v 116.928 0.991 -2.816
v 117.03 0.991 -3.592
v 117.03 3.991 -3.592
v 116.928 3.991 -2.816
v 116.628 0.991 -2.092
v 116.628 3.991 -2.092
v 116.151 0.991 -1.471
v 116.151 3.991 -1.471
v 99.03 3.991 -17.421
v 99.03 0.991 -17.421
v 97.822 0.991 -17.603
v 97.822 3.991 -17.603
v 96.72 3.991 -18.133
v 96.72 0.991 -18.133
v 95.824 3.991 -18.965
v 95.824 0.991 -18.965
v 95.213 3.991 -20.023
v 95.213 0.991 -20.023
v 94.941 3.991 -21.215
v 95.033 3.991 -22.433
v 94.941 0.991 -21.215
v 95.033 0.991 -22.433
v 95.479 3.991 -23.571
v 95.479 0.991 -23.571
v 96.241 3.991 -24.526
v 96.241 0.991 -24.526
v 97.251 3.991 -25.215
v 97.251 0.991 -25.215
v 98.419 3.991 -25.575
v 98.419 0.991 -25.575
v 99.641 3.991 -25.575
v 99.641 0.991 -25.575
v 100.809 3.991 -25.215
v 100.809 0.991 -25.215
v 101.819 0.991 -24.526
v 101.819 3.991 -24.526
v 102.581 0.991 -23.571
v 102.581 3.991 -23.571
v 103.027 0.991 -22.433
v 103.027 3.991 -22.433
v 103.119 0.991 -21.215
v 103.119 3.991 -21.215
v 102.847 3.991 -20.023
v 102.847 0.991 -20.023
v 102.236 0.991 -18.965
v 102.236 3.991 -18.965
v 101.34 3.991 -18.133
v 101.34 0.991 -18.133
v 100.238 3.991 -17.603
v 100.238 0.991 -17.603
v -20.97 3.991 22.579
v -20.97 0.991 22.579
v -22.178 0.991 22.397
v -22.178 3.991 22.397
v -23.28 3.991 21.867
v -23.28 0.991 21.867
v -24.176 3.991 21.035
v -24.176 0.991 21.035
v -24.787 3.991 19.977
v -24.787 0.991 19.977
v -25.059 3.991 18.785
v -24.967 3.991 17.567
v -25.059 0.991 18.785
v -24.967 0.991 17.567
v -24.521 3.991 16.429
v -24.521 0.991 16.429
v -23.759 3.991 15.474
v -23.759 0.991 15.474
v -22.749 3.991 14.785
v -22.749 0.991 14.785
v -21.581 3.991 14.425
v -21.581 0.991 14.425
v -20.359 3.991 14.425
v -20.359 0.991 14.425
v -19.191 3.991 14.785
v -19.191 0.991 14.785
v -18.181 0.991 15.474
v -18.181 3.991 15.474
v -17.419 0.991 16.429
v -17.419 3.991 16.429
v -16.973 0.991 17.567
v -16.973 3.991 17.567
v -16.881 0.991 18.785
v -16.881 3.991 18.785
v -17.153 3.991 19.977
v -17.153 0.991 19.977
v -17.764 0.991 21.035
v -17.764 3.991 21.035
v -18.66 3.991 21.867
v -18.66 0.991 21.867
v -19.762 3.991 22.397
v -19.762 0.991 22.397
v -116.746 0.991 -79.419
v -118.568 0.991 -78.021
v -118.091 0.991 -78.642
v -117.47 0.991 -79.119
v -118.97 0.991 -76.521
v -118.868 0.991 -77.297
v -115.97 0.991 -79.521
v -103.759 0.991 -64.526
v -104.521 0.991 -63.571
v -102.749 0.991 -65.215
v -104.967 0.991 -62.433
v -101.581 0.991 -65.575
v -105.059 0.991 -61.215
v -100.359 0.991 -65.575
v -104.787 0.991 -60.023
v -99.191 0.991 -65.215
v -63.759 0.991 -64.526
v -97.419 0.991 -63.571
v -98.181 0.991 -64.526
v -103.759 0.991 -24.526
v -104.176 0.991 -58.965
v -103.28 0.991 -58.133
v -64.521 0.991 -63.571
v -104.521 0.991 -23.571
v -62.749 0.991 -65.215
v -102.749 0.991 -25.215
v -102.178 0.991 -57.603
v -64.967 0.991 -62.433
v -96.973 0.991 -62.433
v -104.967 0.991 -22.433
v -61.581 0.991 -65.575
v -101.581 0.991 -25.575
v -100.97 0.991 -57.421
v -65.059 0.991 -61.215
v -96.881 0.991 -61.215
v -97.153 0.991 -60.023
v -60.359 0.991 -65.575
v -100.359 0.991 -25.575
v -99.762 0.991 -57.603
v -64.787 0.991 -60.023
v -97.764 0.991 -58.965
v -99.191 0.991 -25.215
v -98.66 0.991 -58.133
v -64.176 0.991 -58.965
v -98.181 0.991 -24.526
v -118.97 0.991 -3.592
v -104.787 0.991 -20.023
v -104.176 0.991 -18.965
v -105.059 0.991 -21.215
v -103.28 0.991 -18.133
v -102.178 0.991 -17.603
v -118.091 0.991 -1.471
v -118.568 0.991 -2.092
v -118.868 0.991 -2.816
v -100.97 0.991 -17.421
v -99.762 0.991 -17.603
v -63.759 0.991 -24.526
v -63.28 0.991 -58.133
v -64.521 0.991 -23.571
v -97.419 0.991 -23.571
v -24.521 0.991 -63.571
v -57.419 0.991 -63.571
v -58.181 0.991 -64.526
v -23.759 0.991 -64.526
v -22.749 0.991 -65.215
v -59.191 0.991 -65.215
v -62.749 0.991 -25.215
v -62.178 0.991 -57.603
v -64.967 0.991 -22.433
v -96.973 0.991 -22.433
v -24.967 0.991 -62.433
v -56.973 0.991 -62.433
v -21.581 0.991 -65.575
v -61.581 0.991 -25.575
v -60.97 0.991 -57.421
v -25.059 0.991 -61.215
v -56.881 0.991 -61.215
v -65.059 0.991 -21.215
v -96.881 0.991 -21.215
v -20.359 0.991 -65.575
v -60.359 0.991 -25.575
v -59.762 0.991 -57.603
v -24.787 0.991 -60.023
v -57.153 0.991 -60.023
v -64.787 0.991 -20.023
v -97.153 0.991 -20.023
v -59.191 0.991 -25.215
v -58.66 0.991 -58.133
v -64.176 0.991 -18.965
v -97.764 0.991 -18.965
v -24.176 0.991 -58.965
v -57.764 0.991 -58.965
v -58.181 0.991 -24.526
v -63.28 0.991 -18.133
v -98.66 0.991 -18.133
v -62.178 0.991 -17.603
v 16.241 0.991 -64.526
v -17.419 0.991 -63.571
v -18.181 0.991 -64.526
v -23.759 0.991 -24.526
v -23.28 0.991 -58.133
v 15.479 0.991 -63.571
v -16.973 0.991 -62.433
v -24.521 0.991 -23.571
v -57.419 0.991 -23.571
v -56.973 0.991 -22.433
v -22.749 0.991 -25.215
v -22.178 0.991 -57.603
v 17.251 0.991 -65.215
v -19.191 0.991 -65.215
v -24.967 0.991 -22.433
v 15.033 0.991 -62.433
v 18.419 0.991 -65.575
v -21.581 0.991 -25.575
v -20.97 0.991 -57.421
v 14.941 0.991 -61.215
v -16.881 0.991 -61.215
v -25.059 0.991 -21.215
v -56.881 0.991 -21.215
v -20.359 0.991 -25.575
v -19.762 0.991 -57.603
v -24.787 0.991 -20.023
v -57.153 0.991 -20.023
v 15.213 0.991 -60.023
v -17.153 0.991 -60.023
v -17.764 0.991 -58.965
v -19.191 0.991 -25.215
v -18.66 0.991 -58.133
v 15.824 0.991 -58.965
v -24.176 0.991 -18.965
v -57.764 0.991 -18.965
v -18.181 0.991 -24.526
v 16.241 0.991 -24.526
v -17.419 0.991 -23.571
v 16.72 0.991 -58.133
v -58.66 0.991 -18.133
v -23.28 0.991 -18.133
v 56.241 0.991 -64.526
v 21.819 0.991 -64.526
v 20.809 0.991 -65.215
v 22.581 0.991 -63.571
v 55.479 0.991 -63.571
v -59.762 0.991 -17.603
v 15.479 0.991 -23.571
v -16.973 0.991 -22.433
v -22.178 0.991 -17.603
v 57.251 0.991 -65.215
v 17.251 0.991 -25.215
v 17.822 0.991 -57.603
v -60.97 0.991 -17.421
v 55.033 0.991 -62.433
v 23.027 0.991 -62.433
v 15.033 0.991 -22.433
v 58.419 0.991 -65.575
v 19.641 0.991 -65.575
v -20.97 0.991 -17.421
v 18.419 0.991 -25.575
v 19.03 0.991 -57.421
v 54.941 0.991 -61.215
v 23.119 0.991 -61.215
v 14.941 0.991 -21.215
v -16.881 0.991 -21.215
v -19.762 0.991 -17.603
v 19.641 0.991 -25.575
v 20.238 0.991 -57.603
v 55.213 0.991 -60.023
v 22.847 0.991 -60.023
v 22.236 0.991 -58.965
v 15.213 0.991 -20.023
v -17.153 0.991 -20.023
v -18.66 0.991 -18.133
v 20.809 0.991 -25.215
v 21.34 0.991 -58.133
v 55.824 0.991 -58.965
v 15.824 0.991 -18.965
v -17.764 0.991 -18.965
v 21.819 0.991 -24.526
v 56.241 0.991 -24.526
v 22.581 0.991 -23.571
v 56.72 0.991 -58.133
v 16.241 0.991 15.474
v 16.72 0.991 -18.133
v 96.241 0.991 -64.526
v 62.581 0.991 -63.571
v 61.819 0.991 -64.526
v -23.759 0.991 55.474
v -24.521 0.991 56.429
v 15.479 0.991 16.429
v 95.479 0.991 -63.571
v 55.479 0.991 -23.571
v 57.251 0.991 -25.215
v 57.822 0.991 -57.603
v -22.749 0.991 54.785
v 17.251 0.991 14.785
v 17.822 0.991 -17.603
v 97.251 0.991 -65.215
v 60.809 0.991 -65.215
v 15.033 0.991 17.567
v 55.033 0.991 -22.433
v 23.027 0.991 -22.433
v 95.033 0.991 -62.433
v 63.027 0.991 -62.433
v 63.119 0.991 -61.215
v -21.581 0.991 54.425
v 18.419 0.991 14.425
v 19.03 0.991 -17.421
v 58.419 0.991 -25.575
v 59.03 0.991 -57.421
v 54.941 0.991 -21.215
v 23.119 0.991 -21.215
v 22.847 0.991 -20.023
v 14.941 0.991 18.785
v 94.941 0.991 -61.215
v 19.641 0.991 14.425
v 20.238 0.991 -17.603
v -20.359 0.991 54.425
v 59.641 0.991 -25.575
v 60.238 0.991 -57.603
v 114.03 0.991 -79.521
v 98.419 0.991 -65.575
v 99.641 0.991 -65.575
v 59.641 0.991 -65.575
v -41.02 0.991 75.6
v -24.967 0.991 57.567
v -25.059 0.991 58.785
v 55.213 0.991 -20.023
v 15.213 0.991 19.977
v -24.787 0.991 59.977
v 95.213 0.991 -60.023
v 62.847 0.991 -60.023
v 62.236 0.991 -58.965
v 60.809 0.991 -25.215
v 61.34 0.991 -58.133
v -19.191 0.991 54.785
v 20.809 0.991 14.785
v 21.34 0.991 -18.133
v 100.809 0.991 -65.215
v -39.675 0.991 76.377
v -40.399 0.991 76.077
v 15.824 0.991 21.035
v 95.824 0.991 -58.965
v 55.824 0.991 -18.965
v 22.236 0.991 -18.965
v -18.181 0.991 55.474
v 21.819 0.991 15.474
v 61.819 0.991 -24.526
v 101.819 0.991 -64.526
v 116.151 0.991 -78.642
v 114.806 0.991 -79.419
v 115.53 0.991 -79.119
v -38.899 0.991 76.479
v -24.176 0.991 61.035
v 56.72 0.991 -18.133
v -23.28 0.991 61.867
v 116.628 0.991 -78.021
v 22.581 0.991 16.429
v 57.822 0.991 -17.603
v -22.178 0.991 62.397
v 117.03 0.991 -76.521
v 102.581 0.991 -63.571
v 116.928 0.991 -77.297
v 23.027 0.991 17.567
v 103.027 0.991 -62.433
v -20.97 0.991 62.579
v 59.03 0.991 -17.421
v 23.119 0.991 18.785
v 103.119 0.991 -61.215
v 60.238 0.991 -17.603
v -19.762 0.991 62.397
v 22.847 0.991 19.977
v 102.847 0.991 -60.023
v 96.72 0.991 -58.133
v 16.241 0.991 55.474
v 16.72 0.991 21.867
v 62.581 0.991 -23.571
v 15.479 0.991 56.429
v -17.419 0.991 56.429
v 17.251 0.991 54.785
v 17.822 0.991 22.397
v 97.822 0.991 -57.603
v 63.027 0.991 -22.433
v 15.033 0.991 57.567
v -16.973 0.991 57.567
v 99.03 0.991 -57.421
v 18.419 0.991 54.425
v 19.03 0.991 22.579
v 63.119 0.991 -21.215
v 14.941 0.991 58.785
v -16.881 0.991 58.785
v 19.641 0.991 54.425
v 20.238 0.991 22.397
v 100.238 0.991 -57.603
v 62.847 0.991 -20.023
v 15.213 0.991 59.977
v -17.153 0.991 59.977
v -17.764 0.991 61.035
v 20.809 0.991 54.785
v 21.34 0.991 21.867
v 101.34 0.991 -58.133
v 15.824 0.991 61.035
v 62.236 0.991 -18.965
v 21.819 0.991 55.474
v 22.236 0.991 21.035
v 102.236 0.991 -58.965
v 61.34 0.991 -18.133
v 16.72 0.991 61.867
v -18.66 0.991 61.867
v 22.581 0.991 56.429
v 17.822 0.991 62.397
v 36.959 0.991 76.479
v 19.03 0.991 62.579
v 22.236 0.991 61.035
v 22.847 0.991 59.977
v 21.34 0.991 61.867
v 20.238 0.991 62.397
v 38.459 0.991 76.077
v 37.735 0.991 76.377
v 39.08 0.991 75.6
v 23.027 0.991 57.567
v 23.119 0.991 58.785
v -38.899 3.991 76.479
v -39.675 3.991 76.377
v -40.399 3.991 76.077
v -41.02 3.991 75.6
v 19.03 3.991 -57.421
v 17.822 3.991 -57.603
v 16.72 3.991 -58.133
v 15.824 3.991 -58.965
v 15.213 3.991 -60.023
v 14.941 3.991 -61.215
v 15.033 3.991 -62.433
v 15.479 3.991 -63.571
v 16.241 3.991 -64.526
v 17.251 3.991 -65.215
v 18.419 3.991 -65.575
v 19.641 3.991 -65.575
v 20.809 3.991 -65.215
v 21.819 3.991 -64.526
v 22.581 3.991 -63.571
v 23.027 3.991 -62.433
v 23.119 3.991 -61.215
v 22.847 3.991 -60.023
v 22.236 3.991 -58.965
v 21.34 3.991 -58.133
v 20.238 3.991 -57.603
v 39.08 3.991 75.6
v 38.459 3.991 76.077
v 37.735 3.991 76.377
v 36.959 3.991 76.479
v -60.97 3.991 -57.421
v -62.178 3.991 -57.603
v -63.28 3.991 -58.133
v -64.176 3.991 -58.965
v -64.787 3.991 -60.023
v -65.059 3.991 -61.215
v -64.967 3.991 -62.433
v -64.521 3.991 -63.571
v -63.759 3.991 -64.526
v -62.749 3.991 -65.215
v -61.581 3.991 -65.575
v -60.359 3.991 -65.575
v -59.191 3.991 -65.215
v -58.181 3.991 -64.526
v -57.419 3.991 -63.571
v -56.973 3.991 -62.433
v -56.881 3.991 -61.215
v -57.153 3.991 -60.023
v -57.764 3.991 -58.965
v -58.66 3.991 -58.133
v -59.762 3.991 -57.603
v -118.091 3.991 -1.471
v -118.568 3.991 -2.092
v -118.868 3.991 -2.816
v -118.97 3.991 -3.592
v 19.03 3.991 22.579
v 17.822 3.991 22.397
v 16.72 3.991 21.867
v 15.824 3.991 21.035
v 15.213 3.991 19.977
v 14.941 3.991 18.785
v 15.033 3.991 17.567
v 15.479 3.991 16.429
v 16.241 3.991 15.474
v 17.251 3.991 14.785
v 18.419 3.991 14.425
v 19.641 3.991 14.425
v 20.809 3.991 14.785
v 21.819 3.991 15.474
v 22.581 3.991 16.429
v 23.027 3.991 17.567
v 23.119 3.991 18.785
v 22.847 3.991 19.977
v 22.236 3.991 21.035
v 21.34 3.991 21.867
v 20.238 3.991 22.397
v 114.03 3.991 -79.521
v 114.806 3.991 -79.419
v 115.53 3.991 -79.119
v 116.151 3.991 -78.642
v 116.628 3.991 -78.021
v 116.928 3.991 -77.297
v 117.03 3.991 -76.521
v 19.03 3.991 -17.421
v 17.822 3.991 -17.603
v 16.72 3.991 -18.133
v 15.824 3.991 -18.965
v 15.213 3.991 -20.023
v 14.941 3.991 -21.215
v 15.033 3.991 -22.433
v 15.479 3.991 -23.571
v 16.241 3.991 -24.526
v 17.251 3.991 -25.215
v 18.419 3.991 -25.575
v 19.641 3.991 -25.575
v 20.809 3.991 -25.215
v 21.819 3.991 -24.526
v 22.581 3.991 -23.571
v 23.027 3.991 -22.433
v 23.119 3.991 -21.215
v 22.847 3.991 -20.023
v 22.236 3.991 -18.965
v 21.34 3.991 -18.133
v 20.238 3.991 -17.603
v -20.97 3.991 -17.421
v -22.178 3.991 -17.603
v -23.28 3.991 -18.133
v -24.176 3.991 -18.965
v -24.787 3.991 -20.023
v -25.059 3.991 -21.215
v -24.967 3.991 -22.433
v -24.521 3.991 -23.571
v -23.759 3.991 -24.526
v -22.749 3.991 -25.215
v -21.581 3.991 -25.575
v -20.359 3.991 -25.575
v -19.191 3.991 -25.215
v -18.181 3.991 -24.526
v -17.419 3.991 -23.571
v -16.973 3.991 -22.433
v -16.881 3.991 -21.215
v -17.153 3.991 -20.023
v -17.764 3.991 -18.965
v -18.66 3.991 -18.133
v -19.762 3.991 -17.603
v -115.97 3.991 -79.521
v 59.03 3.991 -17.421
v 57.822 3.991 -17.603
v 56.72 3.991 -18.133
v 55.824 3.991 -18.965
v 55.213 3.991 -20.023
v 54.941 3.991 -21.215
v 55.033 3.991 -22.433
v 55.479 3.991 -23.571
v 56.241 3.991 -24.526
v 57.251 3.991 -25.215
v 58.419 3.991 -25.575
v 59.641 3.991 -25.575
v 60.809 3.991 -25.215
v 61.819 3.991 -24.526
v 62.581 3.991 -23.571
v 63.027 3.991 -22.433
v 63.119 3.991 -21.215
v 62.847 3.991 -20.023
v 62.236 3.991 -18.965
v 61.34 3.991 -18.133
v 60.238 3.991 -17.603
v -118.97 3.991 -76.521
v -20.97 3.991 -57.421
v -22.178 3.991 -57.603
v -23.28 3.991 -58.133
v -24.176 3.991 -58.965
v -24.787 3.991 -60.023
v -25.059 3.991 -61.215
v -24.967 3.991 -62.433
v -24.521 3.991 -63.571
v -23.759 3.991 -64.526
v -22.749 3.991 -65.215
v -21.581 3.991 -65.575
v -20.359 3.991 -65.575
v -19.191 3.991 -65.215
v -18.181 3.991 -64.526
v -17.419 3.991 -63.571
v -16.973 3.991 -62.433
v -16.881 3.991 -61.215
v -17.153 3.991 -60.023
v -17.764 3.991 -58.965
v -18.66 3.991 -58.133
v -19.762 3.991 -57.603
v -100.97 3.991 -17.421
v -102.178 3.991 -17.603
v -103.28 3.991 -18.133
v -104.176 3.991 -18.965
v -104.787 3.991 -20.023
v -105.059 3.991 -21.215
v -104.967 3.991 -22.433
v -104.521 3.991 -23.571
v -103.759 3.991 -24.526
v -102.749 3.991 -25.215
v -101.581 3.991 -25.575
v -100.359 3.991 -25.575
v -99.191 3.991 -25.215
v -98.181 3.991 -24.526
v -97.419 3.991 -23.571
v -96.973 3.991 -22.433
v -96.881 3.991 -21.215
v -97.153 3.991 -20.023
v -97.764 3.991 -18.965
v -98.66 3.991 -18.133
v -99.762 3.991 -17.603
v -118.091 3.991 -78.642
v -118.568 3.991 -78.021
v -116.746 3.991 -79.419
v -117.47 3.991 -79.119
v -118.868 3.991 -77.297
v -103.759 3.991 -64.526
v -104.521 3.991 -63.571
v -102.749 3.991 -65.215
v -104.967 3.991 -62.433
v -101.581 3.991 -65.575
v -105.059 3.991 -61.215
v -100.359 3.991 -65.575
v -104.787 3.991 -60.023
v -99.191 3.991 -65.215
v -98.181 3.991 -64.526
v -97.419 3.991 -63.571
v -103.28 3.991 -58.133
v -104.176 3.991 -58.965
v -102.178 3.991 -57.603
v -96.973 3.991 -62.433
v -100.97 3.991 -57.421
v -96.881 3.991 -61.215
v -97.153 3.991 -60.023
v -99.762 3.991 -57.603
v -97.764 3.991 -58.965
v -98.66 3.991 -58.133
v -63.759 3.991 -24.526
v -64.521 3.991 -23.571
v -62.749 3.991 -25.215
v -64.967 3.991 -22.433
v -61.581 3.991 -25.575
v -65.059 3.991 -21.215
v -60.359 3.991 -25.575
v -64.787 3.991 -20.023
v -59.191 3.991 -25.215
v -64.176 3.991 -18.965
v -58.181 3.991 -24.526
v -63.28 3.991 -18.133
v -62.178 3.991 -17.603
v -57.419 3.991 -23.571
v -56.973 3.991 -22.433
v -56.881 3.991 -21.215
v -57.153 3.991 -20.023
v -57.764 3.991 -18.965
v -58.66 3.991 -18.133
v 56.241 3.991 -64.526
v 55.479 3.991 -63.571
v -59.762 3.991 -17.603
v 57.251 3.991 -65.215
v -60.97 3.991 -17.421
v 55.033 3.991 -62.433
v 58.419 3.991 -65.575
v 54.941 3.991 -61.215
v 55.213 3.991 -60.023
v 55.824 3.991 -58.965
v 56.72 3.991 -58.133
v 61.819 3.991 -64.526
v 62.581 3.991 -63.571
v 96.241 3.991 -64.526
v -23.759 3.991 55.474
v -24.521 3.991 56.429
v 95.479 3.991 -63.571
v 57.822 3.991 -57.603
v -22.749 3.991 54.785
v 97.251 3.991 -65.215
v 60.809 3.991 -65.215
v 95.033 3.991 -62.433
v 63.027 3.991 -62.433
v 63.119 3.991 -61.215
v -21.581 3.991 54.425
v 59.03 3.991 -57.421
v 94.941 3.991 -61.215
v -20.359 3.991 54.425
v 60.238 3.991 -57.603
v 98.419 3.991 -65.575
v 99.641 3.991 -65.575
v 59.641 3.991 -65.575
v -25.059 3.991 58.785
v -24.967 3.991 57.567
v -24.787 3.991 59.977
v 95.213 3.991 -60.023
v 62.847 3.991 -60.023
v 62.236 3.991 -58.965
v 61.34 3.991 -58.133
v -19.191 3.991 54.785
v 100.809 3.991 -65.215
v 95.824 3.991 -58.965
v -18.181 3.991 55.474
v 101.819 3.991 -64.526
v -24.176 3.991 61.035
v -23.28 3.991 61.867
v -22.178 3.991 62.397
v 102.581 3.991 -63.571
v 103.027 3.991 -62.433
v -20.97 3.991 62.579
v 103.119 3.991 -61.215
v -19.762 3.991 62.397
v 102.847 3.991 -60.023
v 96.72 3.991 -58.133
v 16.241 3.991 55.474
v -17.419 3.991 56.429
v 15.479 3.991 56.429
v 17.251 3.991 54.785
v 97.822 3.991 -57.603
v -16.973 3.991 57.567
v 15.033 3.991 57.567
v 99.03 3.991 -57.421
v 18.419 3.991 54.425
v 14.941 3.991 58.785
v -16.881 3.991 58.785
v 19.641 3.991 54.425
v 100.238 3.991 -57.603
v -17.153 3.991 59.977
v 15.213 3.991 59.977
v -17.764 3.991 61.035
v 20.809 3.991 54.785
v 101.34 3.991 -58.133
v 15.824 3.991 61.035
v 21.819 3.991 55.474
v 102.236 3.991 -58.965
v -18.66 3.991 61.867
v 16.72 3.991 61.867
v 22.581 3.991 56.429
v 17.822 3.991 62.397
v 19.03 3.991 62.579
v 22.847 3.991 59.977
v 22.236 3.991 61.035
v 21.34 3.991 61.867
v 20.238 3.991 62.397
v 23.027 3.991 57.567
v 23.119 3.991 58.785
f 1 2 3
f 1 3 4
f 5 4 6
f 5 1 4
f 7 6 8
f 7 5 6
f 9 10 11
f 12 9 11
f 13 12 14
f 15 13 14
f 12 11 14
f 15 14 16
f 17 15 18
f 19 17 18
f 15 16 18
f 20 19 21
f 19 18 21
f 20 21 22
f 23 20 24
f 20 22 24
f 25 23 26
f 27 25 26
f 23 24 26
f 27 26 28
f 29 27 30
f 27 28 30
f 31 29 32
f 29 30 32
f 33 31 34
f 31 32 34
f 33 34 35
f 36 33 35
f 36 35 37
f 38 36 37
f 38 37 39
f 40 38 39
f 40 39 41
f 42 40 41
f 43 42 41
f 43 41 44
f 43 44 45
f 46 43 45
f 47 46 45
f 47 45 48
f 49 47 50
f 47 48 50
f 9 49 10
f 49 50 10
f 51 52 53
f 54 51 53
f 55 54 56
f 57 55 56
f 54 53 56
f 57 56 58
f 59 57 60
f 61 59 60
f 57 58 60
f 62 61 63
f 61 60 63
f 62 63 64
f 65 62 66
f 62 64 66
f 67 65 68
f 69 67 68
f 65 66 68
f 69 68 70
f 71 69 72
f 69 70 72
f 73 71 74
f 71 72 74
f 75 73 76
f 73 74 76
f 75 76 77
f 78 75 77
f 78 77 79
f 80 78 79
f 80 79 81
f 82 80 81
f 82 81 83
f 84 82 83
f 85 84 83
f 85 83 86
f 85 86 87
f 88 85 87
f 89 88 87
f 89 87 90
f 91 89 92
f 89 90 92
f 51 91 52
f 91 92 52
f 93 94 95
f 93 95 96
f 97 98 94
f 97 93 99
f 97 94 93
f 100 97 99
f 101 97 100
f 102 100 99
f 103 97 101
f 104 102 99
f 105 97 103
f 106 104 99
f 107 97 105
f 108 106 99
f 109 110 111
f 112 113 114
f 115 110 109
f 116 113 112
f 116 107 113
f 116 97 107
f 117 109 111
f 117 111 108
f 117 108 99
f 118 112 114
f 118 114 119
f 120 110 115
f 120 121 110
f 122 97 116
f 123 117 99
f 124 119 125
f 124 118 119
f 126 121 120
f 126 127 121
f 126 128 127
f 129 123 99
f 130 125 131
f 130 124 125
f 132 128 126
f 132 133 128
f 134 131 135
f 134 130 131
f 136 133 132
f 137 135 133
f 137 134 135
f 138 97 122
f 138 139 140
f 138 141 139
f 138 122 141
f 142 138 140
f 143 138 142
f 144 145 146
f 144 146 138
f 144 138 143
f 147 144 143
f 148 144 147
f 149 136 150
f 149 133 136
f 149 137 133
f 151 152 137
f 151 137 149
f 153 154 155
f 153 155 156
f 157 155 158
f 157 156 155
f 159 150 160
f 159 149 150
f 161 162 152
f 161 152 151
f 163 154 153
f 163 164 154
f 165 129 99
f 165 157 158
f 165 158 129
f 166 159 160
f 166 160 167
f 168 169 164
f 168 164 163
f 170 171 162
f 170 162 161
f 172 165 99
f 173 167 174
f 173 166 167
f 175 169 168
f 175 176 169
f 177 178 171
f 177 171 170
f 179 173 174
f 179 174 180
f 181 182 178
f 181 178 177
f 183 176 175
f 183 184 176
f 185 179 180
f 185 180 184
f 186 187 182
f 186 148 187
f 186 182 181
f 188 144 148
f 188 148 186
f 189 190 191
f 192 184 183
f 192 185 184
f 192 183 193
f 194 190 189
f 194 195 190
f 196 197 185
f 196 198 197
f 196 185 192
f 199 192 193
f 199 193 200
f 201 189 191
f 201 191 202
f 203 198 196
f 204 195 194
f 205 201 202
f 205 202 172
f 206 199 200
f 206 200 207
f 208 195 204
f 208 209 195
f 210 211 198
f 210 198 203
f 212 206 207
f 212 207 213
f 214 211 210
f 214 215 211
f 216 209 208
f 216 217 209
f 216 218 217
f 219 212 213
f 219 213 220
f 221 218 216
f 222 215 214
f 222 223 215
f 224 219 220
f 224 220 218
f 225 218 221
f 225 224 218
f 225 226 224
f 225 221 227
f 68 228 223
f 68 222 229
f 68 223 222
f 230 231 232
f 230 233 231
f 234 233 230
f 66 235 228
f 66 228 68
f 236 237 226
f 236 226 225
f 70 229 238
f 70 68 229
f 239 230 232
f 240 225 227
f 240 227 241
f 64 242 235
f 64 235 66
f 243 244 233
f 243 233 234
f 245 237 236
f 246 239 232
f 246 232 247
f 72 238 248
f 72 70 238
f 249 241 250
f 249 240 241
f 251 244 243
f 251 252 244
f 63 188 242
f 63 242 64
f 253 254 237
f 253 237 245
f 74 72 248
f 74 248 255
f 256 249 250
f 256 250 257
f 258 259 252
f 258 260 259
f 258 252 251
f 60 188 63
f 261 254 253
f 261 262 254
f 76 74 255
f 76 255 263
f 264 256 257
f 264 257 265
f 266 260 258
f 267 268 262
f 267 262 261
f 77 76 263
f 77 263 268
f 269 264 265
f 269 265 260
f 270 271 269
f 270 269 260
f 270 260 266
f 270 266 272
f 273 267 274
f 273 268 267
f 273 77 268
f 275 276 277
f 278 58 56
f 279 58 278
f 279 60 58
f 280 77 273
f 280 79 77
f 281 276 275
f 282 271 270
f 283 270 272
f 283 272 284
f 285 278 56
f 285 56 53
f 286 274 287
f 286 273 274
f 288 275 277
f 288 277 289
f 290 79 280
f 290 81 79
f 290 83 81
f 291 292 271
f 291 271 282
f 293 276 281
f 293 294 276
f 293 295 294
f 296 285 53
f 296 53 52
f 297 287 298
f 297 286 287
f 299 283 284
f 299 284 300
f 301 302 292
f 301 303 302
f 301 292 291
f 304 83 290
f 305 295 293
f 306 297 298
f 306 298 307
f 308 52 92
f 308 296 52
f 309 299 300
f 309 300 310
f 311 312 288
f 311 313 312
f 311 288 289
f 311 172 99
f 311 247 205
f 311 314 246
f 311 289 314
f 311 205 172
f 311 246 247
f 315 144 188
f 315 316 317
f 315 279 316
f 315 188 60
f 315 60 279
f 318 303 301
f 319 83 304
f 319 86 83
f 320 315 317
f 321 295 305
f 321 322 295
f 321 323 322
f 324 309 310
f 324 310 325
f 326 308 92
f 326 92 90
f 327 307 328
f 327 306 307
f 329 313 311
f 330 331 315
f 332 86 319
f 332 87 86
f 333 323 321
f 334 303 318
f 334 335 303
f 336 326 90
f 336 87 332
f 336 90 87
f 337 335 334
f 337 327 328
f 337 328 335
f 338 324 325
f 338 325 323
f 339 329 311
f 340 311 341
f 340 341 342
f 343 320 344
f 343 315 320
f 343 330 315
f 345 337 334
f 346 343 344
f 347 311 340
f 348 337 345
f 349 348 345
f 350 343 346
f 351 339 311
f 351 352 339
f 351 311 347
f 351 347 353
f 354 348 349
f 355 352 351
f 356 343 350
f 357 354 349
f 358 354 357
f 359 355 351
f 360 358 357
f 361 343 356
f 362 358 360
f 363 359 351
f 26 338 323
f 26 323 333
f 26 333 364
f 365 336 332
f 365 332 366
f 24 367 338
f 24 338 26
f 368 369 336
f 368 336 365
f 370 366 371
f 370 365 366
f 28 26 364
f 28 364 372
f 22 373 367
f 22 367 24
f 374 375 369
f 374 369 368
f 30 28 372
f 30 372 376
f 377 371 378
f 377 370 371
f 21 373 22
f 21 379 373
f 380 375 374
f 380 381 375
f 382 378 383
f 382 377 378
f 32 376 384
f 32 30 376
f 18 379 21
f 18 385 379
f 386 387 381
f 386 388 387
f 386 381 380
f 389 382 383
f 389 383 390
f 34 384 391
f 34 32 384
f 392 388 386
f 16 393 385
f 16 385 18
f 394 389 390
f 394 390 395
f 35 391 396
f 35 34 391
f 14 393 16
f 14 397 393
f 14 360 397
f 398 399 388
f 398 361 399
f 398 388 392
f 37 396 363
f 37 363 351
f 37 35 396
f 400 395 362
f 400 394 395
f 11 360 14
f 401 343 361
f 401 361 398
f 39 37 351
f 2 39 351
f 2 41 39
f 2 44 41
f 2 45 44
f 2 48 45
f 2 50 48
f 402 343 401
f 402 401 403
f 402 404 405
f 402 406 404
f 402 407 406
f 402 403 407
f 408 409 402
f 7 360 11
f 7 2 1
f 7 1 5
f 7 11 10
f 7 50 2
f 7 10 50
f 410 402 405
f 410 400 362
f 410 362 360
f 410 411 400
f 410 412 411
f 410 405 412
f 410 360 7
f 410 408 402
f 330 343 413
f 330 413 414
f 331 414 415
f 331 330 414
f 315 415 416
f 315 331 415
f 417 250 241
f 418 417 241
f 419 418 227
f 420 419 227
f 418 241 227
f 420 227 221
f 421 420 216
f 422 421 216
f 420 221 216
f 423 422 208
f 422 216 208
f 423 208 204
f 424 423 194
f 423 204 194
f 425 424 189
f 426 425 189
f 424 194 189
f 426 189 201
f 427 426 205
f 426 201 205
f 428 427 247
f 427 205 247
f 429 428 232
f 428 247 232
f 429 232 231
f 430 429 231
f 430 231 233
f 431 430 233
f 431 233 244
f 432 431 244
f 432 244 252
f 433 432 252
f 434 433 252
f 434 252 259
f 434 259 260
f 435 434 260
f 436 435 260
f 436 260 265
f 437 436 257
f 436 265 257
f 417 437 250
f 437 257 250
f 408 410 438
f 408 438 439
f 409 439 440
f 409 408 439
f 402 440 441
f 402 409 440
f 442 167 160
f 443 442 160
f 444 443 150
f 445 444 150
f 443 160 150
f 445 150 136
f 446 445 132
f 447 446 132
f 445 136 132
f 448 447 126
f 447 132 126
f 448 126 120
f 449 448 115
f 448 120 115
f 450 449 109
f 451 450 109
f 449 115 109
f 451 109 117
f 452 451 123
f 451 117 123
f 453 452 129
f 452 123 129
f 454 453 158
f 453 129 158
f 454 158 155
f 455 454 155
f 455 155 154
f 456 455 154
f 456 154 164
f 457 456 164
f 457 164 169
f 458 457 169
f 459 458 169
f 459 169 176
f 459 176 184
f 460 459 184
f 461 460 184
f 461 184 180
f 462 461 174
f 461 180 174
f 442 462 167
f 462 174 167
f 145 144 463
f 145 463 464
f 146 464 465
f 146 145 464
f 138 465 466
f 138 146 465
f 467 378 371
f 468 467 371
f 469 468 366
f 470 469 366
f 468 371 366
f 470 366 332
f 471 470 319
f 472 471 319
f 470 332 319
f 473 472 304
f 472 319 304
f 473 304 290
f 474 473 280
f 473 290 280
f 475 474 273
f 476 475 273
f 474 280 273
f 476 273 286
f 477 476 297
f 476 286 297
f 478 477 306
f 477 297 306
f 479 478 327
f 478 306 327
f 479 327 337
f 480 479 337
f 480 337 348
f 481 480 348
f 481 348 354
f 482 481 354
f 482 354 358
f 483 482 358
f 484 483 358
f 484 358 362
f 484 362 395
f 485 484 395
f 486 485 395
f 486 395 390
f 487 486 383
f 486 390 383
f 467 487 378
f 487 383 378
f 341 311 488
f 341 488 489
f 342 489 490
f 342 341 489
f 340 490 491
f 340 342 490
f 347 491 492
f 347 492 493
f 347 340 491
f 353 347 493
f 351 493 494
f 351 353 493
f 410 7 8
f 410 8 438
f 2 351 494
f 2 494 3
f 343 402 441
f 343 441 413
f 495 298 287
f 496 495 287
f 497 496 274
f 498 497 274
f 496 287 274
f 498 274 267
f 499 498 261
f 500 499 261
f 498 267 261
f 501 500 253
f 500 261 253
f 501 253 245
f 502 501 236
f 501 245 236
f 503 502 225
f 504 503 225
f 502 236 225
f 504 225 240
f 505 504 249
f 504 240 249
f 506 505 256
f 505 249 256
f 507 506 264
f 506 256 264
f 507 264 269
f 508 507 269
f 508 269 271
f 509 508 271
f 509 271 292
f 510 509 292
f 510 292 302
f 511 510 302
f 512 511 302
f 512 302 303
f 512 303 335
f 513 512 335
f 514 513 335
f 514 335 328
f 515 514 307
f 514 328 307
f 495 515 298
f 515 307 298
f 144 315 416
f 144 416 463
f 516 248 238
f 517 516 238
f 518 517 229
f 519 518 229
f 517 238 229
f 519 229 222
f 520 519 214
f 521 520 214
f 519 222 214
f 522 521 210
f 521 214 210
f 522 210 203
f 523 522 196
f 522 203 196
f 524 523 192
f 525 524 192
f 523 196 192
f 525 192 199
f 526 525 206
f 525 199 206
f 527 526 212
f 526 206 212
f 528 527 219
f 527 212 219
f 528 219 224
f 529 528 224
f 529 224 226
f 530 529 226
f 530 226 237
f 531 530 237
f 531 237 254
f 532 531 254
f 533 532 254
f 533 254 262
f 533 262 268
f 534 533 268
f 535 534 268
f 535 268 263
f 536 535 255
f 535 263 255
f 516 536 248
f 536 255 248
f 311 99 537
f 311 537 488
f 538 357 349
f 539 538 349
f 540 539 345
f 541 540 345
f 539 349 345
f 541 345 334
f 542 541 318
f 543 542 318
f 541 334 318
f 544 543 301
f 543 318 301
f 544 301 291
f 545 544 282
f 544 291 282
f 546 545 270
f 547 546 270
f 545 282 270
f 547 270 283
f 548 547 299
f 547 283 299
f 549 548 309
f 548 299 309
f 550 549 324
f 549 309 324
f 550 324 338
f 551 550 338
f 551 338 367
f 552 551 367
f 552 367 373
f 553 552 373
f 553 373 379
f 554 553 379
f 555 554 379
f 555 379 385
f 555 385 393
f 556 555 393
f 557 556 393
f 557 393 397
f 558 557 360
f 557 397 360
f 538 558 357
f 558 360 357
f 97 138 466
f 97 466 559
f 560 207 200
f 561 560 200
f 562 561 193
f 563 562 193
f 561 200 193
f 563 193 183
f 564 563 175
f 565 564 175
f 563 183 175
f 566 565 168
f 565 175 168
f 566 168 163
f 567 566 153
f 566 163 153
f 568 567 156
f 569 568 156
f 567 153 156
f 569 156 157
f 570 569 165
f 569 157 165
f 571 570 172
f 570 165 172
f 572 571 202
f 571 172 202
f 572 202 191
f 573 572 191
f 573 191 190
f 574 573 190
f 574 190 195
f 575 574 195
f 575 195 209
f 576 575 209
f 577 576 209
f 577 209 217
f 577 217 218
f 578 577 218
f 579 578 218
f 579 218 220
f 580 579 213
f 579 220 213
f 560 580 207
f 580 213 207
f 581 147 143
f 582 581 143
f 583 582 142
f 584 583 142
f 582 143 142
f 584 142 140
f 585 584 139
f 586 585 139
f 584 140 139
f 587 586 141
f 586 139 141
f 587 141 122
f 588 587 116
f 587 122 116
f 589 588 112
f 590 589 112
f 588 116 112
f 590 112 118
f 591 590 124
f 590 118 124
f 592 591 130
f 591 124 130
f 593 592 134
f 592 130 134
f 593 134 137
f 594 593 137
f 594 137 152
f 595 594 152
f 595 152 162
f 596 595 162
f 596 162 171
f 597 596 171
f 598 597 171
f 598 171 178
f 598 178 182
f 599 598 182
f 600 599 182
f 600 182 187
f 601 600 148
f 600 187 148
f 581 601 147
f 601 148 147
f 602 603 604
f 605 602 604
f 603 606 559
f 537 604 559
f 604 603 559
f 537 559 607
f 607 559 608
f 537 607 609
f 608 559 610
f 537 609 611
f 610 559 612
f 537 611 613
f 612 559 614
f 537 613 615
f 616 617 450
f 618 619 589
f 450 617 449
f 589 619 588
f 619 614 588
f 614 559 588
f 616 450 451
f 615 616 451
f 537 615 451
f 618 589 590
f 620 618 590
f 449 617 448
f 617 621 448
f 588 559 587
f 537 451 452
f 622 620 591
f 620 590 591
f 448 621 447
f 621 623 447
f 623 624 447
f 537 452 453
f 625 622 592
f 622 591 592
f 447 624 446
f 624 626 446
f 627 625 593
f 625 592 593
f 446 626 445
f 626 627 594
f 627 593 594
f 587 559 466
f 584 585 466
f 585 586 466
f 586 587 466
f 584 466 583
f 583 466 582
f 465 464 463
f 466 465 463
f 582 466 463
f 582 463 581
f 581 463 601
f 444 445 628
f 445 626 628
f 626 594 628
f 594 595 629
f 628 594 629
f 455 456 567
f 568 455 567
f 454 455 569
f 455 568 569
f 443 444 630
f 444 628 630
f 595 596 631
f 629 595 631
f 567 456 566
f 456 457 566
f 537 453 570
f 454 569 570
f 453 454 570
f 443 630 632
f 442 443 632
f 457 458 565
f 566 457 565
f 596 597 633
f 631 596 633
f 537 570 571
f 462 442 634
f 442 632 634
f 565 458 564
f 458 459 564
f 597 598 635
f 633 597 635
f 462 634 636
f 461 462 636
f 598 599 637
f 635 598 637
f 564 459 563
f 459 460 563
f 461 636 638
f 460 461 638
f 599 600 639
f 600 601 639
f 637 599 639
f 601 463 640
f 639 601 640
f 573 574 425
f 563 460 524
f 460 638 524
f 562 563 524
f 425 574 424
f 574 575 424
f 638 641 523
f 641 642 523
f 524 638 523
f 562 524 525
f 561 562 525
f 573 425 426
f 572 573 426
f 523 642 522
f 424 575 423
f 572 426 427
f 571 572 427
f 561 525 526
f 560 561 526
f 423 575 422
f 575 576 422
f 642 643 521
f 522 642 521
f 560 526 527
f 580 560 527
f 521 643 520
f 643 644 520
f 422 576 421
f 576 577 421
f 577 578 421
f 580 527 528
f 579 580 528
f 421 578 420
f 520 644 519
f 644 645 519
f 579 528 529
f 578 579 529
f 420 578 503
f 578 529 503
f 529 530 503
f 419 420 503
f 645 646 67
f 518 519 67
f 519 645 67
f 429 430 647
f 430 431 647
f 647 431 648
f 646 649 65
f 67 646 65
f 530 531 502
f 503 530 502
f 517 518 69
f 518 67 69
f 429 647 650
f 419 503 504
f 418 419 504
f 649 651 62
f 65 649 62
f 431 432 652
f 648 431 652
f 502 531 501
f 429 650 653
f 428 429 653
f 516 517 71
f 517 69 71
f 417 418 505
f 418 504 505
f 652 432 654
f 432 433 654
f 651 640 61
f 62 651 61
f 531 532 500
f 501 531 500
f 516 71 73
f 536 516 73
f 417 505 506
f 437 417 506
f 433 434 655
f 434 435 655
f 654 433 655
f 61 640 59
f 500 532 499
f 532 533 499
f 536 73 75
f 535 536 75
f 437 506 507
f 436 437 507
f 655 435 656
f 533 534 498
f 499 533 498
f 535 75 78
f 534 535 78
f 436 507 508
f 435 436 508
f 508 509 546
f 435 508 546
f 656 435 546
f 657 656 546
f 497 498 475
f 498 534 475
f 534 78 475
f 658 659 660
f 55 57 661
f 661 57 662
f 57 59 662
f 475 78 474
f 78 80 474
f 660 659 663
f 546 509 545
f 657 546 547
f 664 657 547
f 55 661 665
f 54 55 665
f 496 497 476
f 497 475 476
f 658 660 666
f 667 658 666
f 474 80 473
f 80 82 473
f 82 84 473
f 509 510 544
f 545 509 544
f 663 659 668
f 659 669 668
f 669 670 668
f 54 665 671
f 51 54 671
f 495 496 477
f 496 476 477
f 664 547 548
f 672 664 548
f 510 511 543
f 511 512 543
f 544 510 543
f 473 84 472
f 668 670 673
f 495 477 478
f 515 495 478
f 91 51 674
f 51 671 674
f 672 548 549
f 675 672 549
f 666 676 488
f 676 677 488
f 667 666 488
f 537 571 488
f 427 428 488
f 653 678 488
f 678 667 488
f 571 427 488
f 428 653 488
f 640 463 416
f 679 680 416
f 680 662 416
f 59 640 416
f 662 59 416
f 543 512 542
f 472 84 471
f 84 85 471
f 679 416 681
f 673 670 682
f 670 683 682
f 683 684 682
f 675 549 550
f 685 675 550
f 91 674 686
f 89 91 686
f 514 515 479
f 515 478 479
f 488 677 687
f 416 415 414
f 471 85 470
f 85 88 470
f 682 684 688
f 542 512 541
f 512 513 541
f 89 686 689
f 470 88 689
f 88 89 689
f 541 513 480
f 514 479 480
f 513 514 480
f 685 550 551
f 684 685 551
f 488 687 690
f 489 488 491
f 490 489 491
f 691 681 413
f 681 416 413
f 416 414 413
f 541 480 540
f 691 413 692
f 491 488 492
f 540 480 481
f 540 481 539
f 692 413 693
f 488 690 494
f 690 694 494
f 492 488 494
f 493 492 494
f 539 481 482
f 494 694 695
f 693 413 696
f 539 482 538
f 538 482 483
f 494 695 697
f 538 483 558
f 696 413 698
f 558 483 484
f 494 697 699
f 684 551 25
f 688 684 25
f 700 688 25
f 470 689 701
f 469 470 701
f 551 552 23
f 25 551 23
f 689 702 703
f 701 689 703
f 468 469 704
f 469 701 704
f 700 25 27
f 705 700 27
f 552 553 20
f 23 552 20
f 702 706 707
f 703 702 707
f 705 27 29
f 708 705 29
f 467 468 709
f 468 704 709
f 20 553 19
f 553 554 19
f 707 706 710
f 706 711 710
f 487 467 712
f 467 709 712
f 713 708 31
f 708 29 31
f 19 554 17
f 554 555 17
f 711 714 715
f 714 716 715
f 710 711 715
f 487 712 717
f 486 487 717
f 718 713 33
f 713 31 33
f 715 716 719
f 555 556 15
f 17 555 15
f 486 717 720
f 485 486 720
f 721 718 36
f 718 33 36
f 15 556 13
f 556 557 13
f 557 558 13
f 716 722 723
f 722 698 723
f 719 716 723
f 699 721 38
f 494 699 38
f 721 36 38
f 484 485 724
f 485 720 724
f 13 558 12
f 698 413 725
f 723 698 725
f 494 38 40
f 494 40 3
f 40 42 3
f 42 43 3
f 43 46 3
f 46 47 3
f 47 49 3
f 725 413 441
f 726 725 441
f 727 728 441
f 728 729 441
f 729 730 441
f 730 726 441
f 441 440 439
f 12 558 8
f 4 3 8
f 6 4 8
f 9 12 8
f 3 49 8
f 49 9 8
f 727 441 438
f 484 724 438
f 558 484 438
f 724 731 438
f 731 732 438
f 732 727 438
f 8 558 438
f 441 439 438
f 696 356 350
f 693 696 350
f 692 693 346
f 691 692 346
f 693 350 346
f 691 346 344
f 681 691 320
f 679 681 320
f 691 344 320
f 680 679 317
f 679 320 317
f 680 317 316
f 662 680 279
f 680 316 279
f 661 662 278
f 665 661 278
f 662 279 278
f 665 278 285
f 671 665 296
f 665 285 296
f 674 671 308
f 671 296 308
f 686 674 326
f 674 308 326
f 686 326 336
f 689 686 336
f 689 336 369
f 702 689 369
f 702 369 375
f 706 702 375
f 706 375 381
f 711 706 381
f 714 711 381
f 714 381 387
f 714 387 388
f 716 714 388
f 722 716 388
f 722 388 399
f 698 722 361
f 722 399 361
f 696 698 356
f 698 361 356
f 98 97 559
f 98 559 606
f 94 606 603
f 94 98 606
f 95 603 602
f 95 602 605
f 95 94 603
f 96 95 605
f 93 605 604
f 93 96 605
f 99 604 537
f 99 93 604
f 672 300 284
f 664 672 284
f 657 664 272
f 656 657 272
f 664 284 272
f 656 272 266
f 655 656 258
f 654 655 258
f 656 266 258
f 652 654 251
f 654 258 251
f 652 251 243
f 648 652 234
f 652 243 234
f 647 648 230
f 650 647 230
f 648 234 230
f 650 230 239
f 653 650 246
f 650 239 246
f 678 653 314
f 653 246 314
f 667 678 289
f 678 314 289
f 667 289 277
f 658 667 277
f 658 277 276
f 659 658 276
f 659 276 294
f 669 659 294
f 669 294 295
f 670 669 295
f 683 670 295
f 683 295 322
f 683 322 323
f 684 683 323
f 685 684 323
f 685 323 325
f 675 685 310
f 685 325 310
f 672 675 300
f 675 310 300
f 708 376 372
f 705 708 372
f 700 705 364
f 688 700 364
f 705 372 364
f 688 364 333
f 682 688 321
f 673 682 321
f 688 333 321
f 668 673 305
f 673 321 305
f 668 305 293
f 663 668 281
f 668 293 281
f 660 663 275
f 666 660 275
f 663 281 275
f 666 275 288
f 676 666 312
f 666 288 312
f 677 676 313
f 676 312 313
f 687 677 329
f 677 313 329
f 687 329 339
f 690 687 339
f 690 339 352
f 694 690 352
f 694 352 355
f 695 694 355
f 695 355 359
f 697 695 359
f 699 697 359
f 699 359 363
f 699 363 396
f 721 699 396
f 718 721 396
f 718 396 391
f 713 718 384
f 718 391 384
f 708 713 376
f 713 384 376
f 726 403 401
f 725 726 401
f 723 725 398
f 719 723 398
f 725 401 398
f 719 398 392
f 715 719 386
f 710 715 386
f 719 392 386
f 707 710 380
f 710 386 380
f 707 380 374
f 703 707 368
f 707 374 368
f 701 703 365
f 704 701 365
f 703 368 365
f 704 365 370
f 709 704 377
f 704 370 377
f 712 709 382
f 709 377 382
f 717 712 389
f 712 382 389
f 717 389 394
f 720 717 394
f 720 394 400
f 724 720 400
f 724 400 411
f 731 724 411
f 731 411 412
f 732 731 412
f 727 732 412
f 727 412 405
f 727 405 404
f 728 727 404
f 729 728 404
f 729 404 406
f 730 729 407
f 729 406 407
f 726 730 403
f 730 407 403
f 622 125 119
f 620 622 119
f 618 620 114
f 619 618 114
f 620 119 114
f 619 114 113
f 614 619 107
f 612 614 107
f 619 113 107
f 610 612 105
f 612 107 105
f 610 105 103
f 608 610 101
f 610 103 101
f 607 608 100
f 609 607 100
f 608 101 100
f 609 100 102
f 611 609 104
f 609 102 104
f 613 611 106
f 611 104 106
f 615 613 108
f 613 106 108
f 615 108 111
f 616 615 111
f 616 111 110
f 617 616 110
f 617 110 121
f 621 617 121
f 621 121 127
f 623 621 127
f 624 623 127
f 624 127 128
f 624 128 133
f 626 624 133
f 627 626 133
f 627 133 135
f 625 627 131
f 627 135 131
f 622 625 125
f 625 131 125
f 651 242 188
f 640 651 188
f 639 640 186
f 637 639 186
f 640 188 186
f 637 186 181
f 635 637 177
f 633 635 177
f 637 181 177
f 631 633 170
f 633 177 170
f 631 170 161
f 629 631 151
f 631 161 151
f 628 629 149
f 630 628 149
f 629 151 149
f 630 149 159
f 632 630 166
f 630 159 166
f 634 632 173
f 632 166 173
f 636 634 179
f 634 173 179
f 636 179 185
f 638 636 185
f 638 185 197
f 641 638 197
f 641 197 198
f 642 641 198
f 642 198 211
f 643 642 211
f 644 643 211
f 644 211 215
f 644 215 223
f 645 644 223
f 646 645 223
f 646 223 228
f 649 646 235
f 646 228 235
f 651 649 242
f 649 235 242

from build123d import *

# Parameters (mm, degrees)
SKETCH_1_R      = 4.1
EXTRUDE_1_DEPTH = 3


with BuildPart() as part:
    # Эскиз1 → Бобышка-Вытянуть1 (new body)
    with BuildSketch(Plane.XZ.offset(-0.99134831)):
        with BuildLine():
            Line((36.958930758, 76.479058001), (-38.898933619, 76.479058001))
            ThreePointArc((-38.898933619, 76.479058001), (-40.046983916, 76.250696599), (-41.020253962, 75.600378345))
            Line((-41.020253962, 75.600378345), (-118.091321774, -1.470689467))
            ThreePointArc((-118.091321774, -1.470689467), (-118.741640028, -2.443959513), (-118.970001431, -3.592009811))
            Line((-118.970001431, -3.592009811), (-118.970001431, -76.520941999))
            ThreePointArc((-118.970001431, -76.520941999), (-118.091321774, -78.642262342), (-115.970001431, -79.520941999))
            Line((-115.970001431, -79.520941999), (114.029998569, -79.520941999))
            ThreePointArc((114.029998569, -79.520941999), (116.151318913, -78.642262342), (117.029998569, -76.520941999))
            Line((117.029998569, -76.520941999), (117.029998569, -3.592009811))
            ThreePointArc((117.029998569, -3.592009811), (116.801637167, -2.443959513), (116.151318913, -1.470689467))
            Line((116.151318913, -1.470689467), (39.080251101, 75.600378345))
            ThreePointArc((39.080251101, 75.600378345), (38.106981055, 76.250696599), (36.958930758, 76.479058001))
        make_face()
        with Locations(Location((99.029998569, -21.520941999, 0), (0, 0, 90))):  # turned: the seam where the file's is
            Circle(SKETCH_1_R, mode=Mode.SUBTRACT)
        with Locations(Location((59.029998569, -21.520941999, 0), (0, 0, 90))):  # turned: the seam where the file's is
            Circle(SKETCH_1_R, mode=Mode.SUBTRACT)
        with Locations(Location((19.029998569, 58.479058001, 0), (0, 0, 90))):  # turned: the seam where the file's is
            Circle(SKETCH_1_R, mode=Mode.SUBTRACT)
        with Locations(Location((19.029998569, 18.479058001, 0), (0, 0, 90))):  # turned: the seam where the file's is
            Circle(SKETCH_1_R, mode=Mode.SUBTRACT)
        with Locations(Location((19.029998569, -21.520941999, 0), (0, 0, 90))):  # turned: the seam where the file's is
            Circle(SKETCH_1_R, mode=Mode.SUBTRACT)
        with Locations(Location((99.029998569, -61.520941999, 0), (0, 0, 90))):  # turned: the seam where the file's is
            Circle(SKETCH_1_R, mode=Mode.SUBTRACT)
        with Locations(Location((59.029998569, -61.520941999, 0), (0, 0, 90))):  # turned: the seam where the file's is
            Circle(SKETCH_1_R, mode=Mode.SUBTRACT)
        with Locations(Location((19.029998569, -61.520941999, 0), (0, 0, 90))):  # turned: the seam where the file's is
            Circle(SKETCH_1_R, mode=Mode.SUBTRACT)
        with Locations(Location((-100.970001431, -21.520941999, 0), (0, 0, 90))):  # turned: the seam where the file's is
            Circle(SKETCH_1_R, mode=Mode.SUBTRACT)
        with Locations(Location((-60.970001431, -21.520941999, 0), (0, 0, 90))):  # turned: the seam where the file's is
            Circle(SKETCH_1_R, mode=Mode.SUBTRACT)
        with Locations(Location((-20.970001431, 58.479058001, 0), (0, 0, 90))):  # turned: the seam where the file's is
            Circle(SKETCH_1_R, mode=Mode.SUBTRACT)
        with Locations(Location((-20.970001431, 18.479058001, 0), (0, 0, 90))):  # turned: the seam where the file's is
            Circle(SKETCH_1_R, mode=Mode.SUBTRACT)
        with Locations(Location((-20.970001431, -21.520941999, 0), (0, 0, 90))):  # turned: the seam where the file's is
            Circle(SKETCH_1_R, mode=Mode.SUBTRACT)
        with Locations(Location((-100.970001431, -61.520941999, 0), (0, 0, 90))):  # turned: the seam where the file's is
            Circle(SKETCH_1_R, mode=Mode.SUBTRACT)
        with Locations(Location((-60.970001431, -61.520941999, 0), (0, 0, 90))):  # turned: the seam where the file's is
            Circle(SKETCH_1_R, mode=Mode.SUBTRACT)
        with Locations(Location((-20.970001431, -61.520941999, 0), (0, 0, 90))):  # turned: the seam where the file's is
            Circle(SKETCH_1_R, mode=Mode.SUBTRACT)
    extrude(amount=-EXTRUDE_1_DEPTH)


solid = part.part
